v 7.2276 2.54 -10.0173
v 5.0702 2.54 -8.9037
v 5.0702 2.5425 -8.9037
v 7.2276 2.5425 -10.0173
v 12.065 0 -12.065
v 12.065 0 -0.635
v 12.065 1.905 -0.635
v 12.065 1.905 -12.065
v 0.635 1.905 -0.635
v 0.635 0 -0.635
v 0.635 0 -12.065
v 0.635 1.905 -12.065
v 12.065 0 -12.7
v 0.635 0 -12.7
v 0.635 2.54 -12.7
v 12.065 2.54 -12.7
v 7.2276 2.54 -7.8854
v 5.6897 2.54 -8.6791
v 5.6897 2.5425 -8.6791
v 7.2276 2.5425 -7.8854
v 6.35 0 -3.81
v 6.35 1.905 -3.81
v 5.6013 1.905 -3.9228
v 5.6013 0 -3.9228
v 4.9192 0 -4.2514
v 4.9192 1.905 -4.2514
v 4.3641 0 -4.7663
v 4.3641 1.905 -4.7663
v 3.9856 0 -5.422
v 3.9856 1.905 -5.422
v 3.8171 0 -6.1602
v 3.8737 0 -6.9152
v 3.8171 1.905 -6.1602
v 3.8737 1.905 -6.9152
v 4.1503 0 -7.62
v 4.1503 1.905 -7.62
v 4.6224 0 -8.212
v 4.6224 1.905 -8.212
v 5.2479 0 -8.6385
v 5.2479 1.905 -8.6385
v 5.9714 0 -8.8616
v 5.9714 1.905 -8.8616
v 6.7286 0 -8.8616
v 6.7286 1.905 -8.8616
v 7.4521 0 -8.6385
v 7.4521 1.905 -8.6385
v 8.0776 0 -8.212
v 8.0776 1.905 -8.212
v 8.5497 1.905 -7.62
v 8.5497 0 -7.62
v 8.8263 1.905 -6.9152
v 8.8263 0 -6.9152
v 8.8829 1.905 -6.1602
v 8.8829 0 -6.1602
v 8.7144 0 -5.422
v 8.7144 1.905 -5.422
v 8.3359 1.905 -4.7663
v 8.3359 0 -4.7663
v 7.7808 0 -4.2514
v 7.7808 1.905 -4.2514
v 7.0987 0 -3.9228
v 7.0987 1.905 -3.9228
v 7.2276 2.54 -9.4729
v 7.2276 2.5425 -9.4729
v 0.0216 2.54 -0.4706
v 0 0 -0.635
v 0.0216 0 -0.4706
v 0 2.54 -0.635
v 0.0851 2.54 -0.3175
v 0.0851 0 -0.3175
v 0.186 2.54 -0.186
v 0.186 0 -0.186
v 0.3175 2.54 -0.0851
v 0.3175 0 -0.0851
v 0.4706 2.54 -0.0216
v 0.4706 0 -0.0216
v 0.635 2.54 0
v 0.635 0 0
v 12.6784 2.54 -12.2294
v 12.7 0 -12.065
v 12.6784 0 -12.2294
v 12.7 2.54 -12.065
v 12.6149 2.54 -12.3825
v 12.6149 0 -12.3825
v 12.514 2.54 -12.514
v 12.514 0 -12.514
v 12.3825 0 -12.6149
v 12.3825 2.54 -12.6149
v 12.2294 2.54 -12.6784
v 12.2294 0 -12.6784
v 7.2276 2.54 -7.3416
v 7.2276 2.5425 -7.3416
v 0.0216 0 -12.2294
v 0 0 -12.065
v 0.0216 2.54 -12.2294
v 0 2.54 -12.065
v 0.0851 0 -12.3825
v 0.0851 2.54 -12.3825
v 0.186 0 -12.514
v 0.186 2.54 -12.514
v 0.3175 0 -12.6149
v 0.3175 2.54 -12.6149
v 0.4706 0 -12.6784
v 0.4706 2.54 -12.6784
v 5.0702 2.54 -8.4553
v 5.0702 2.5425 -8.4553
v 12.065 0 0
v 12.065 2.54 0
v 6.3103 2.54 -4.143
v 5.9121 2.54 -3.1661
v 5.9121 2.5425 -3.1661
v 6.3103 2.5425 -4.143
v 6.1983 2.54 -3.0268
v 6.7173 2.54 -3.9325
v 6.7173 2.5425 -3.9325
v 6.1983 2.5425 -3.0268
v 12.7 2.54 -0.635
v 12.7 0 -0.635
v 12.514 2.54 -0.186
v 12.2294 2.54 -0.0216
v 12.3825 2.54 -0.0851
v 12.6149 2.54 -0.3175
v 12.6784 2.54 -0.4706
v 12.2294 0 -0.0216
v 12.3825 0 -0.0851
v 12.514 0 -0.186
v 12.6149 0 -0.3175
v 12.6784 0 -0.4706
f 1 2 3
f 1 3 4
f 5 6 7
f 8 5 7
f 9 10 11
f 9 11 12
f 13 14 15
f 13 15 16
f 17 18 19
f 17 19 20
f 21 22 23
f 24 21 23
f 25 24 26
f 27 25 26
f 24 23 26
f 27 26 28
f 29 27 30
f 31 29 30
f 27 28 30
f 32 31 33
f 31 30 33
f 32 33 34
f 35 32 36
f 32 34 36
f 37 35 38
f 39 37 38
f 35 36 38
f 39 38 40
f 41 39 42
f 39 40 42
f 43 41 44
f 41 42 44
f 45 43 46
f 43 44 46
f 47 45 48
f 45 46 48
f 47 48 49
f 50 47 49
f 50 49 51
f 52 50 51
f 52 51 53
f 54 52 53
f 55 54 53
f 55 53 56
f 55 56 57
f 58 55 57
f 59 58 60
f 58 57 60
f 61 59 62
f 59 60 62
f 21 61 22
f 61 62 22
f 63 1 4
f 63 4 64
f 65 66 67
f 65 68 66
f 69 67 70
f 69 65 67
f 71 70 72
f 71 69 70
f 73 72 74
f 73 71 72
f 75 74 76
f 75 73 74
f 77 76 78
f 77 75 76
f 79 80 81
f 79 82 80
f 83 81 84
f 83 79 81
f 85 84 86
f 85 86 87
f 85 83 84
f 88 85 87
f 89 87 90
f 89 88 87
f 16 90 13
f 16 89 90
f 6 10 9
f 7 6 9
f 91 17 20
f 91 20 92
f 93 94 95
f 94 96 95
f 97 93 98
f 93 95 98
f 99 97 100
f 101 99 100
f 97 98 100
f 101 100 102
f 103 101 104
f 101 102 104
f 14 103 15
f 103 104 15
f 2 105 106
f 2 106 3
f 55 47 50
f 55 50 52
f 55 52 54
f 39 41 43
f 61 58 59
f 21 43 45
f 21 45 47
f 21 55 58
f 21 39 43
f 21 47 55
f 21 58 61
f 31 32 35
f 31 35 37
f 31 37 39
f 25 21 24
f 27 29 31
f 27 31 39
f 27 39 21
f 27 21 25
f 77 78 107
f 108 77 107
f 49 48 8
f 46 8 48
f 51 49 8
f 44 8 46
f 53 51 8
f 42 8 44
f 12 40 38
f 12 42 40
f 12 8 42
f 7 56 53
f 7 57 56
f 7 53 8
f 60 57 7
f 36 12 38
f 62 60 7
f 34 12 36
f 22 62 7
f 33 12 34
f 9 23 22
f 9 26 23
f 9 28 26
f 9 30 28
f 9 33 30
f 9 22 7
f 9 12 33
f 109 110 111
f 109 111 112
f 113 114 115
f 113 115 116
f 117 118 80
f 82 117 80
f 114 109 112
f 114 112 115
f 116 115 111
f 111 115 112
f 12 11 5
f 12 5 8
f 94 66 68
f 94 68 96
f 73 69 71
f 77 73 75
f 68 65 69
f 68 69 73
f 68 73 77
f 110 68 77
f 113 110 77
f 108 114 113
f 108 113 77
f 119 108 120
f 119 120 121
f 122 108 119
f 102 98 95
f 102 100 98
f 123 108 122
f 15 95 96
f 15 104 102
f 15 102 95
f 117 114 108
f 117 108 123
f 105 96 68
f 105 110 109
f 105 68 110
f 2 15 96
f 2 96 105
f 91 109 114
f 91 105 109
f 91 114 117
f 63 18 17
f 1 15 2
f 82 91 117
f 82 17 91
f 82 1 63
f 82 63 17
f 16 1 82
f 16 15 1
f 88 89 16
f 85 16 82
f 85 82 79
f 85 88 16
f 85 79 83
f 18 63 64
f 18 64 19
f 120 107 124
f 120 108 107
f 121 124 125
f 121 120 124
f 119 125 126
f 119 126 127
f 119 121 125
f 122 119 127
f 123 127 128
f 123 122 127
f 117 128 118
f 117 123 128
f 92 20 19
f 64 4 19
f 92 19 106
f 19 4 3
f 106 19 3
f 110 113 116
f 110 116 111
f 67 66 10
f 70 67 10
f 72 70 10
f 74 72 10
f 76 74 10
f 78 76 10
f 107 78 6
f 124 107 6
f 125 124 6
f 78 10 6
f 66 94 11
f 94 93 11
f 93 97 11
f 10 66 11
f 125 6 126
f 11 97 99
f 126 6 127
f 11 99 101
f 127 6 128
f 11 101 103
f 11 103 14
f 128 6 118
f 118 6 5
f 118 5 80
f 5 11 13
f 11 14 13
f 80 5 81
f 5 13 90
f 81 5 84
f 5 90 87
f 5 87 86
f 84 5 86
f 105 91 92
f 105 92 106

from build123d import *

# Parameters (mm, degrees)
SKETCH1_W           = 12.7
SKETCH1_H           = 12.7
BOSS_EXTRUDE1_DEPTH = 2.54
FILLET1_R           = 0.635
SHELL1_START        = 0.635
SHELL1_OUTLINE_W    = 1.905
SHELL1_OUTLINE_H    = 11.43
SHELL1_DEPTH        = 11.43
SKETCH2_R           = 2.54
BOSS_EXTRUDE2_DEPTH = 1.905
BOSS_EXTRUDE3_DEPTH = 0.00254


# Read off the part's stored shape, not the designer's step: Shell1
with BuildPart() as part:
    # Sketch1 → Boss-Extrude1 (new body)
    with BuildSketch(Plane(origin=(0, 0, 0), x_dir=(1, 0, 0), z_dir=(0, 1, 0))):
        with Locations((6.35, 6.35)):
            Rectangle(SKETCH1_W, SKETCH1_H)
    extrude(amount=BOSS_EXTRUDE1_DEPTH)

    # Fillet1
    fillet1_edges = [part.edges().sort_by_distance(p)[0] for p in [
        (0, 1.27, -12.7),
        (12.7, 1.27, -12.7),
        (12.7, 1.27, 0),
        (0, 1.27, 0),
    ]]
    fillet(fillet1_edges, radius=FILLET1_R)

    # Shell1 outline → Shell1 (cut)
    with BuildSketch(Plane.YZ.offset(SHELL1_START)):
        with Locations((0.9525, -6.35)):
            Rectangle(SHELL1_OUTLINE_W, SHELL1_OUTLINE_H)
    extrude(amount=SHELL1_DEPTH, mode=Mode.SUBTRACT)

    # Sketch2 → Boss-Extrude2 (add)
    with BuildSketch(Plane(origin=(0, 1.905, 0), x_dir=(-1, 0, 0), z_dir=(0, -1, 0))):
        with Locations(Location((-6.35, 6.35, 0), (0, 0, 270))):
            Circle(SKETCH2_R)
    extrude(amount=BOSS_EXTRUDE2_DEPTH)

    # Sketch3 → Boss-Extrude3 (add)
    with BuildSketch(Plane(origin=(0, 2.54, 0), x_dir=(1, 0, 0), z_dir=(0, 1, 0))):
        Polygon((7.227602564, 7.885397436), (7.227602564, 7.341602364), (5.070230769, 8.455269231), (5.070230769, 8.903661659), (7.227602564, 10.017328526), (7.227602564, 9.472897436), (5.689711939, 8.679147436), align=None)
        Polygon((6.310271795, 4.143044271), (6.717323077, 3.932522436), (6.198332692, 3.026833333), (5.91212476, 3.166121194), align=None)
    extrude(amount=BOSS_EXTRUDE3_DEPTH)


solid = part.part
